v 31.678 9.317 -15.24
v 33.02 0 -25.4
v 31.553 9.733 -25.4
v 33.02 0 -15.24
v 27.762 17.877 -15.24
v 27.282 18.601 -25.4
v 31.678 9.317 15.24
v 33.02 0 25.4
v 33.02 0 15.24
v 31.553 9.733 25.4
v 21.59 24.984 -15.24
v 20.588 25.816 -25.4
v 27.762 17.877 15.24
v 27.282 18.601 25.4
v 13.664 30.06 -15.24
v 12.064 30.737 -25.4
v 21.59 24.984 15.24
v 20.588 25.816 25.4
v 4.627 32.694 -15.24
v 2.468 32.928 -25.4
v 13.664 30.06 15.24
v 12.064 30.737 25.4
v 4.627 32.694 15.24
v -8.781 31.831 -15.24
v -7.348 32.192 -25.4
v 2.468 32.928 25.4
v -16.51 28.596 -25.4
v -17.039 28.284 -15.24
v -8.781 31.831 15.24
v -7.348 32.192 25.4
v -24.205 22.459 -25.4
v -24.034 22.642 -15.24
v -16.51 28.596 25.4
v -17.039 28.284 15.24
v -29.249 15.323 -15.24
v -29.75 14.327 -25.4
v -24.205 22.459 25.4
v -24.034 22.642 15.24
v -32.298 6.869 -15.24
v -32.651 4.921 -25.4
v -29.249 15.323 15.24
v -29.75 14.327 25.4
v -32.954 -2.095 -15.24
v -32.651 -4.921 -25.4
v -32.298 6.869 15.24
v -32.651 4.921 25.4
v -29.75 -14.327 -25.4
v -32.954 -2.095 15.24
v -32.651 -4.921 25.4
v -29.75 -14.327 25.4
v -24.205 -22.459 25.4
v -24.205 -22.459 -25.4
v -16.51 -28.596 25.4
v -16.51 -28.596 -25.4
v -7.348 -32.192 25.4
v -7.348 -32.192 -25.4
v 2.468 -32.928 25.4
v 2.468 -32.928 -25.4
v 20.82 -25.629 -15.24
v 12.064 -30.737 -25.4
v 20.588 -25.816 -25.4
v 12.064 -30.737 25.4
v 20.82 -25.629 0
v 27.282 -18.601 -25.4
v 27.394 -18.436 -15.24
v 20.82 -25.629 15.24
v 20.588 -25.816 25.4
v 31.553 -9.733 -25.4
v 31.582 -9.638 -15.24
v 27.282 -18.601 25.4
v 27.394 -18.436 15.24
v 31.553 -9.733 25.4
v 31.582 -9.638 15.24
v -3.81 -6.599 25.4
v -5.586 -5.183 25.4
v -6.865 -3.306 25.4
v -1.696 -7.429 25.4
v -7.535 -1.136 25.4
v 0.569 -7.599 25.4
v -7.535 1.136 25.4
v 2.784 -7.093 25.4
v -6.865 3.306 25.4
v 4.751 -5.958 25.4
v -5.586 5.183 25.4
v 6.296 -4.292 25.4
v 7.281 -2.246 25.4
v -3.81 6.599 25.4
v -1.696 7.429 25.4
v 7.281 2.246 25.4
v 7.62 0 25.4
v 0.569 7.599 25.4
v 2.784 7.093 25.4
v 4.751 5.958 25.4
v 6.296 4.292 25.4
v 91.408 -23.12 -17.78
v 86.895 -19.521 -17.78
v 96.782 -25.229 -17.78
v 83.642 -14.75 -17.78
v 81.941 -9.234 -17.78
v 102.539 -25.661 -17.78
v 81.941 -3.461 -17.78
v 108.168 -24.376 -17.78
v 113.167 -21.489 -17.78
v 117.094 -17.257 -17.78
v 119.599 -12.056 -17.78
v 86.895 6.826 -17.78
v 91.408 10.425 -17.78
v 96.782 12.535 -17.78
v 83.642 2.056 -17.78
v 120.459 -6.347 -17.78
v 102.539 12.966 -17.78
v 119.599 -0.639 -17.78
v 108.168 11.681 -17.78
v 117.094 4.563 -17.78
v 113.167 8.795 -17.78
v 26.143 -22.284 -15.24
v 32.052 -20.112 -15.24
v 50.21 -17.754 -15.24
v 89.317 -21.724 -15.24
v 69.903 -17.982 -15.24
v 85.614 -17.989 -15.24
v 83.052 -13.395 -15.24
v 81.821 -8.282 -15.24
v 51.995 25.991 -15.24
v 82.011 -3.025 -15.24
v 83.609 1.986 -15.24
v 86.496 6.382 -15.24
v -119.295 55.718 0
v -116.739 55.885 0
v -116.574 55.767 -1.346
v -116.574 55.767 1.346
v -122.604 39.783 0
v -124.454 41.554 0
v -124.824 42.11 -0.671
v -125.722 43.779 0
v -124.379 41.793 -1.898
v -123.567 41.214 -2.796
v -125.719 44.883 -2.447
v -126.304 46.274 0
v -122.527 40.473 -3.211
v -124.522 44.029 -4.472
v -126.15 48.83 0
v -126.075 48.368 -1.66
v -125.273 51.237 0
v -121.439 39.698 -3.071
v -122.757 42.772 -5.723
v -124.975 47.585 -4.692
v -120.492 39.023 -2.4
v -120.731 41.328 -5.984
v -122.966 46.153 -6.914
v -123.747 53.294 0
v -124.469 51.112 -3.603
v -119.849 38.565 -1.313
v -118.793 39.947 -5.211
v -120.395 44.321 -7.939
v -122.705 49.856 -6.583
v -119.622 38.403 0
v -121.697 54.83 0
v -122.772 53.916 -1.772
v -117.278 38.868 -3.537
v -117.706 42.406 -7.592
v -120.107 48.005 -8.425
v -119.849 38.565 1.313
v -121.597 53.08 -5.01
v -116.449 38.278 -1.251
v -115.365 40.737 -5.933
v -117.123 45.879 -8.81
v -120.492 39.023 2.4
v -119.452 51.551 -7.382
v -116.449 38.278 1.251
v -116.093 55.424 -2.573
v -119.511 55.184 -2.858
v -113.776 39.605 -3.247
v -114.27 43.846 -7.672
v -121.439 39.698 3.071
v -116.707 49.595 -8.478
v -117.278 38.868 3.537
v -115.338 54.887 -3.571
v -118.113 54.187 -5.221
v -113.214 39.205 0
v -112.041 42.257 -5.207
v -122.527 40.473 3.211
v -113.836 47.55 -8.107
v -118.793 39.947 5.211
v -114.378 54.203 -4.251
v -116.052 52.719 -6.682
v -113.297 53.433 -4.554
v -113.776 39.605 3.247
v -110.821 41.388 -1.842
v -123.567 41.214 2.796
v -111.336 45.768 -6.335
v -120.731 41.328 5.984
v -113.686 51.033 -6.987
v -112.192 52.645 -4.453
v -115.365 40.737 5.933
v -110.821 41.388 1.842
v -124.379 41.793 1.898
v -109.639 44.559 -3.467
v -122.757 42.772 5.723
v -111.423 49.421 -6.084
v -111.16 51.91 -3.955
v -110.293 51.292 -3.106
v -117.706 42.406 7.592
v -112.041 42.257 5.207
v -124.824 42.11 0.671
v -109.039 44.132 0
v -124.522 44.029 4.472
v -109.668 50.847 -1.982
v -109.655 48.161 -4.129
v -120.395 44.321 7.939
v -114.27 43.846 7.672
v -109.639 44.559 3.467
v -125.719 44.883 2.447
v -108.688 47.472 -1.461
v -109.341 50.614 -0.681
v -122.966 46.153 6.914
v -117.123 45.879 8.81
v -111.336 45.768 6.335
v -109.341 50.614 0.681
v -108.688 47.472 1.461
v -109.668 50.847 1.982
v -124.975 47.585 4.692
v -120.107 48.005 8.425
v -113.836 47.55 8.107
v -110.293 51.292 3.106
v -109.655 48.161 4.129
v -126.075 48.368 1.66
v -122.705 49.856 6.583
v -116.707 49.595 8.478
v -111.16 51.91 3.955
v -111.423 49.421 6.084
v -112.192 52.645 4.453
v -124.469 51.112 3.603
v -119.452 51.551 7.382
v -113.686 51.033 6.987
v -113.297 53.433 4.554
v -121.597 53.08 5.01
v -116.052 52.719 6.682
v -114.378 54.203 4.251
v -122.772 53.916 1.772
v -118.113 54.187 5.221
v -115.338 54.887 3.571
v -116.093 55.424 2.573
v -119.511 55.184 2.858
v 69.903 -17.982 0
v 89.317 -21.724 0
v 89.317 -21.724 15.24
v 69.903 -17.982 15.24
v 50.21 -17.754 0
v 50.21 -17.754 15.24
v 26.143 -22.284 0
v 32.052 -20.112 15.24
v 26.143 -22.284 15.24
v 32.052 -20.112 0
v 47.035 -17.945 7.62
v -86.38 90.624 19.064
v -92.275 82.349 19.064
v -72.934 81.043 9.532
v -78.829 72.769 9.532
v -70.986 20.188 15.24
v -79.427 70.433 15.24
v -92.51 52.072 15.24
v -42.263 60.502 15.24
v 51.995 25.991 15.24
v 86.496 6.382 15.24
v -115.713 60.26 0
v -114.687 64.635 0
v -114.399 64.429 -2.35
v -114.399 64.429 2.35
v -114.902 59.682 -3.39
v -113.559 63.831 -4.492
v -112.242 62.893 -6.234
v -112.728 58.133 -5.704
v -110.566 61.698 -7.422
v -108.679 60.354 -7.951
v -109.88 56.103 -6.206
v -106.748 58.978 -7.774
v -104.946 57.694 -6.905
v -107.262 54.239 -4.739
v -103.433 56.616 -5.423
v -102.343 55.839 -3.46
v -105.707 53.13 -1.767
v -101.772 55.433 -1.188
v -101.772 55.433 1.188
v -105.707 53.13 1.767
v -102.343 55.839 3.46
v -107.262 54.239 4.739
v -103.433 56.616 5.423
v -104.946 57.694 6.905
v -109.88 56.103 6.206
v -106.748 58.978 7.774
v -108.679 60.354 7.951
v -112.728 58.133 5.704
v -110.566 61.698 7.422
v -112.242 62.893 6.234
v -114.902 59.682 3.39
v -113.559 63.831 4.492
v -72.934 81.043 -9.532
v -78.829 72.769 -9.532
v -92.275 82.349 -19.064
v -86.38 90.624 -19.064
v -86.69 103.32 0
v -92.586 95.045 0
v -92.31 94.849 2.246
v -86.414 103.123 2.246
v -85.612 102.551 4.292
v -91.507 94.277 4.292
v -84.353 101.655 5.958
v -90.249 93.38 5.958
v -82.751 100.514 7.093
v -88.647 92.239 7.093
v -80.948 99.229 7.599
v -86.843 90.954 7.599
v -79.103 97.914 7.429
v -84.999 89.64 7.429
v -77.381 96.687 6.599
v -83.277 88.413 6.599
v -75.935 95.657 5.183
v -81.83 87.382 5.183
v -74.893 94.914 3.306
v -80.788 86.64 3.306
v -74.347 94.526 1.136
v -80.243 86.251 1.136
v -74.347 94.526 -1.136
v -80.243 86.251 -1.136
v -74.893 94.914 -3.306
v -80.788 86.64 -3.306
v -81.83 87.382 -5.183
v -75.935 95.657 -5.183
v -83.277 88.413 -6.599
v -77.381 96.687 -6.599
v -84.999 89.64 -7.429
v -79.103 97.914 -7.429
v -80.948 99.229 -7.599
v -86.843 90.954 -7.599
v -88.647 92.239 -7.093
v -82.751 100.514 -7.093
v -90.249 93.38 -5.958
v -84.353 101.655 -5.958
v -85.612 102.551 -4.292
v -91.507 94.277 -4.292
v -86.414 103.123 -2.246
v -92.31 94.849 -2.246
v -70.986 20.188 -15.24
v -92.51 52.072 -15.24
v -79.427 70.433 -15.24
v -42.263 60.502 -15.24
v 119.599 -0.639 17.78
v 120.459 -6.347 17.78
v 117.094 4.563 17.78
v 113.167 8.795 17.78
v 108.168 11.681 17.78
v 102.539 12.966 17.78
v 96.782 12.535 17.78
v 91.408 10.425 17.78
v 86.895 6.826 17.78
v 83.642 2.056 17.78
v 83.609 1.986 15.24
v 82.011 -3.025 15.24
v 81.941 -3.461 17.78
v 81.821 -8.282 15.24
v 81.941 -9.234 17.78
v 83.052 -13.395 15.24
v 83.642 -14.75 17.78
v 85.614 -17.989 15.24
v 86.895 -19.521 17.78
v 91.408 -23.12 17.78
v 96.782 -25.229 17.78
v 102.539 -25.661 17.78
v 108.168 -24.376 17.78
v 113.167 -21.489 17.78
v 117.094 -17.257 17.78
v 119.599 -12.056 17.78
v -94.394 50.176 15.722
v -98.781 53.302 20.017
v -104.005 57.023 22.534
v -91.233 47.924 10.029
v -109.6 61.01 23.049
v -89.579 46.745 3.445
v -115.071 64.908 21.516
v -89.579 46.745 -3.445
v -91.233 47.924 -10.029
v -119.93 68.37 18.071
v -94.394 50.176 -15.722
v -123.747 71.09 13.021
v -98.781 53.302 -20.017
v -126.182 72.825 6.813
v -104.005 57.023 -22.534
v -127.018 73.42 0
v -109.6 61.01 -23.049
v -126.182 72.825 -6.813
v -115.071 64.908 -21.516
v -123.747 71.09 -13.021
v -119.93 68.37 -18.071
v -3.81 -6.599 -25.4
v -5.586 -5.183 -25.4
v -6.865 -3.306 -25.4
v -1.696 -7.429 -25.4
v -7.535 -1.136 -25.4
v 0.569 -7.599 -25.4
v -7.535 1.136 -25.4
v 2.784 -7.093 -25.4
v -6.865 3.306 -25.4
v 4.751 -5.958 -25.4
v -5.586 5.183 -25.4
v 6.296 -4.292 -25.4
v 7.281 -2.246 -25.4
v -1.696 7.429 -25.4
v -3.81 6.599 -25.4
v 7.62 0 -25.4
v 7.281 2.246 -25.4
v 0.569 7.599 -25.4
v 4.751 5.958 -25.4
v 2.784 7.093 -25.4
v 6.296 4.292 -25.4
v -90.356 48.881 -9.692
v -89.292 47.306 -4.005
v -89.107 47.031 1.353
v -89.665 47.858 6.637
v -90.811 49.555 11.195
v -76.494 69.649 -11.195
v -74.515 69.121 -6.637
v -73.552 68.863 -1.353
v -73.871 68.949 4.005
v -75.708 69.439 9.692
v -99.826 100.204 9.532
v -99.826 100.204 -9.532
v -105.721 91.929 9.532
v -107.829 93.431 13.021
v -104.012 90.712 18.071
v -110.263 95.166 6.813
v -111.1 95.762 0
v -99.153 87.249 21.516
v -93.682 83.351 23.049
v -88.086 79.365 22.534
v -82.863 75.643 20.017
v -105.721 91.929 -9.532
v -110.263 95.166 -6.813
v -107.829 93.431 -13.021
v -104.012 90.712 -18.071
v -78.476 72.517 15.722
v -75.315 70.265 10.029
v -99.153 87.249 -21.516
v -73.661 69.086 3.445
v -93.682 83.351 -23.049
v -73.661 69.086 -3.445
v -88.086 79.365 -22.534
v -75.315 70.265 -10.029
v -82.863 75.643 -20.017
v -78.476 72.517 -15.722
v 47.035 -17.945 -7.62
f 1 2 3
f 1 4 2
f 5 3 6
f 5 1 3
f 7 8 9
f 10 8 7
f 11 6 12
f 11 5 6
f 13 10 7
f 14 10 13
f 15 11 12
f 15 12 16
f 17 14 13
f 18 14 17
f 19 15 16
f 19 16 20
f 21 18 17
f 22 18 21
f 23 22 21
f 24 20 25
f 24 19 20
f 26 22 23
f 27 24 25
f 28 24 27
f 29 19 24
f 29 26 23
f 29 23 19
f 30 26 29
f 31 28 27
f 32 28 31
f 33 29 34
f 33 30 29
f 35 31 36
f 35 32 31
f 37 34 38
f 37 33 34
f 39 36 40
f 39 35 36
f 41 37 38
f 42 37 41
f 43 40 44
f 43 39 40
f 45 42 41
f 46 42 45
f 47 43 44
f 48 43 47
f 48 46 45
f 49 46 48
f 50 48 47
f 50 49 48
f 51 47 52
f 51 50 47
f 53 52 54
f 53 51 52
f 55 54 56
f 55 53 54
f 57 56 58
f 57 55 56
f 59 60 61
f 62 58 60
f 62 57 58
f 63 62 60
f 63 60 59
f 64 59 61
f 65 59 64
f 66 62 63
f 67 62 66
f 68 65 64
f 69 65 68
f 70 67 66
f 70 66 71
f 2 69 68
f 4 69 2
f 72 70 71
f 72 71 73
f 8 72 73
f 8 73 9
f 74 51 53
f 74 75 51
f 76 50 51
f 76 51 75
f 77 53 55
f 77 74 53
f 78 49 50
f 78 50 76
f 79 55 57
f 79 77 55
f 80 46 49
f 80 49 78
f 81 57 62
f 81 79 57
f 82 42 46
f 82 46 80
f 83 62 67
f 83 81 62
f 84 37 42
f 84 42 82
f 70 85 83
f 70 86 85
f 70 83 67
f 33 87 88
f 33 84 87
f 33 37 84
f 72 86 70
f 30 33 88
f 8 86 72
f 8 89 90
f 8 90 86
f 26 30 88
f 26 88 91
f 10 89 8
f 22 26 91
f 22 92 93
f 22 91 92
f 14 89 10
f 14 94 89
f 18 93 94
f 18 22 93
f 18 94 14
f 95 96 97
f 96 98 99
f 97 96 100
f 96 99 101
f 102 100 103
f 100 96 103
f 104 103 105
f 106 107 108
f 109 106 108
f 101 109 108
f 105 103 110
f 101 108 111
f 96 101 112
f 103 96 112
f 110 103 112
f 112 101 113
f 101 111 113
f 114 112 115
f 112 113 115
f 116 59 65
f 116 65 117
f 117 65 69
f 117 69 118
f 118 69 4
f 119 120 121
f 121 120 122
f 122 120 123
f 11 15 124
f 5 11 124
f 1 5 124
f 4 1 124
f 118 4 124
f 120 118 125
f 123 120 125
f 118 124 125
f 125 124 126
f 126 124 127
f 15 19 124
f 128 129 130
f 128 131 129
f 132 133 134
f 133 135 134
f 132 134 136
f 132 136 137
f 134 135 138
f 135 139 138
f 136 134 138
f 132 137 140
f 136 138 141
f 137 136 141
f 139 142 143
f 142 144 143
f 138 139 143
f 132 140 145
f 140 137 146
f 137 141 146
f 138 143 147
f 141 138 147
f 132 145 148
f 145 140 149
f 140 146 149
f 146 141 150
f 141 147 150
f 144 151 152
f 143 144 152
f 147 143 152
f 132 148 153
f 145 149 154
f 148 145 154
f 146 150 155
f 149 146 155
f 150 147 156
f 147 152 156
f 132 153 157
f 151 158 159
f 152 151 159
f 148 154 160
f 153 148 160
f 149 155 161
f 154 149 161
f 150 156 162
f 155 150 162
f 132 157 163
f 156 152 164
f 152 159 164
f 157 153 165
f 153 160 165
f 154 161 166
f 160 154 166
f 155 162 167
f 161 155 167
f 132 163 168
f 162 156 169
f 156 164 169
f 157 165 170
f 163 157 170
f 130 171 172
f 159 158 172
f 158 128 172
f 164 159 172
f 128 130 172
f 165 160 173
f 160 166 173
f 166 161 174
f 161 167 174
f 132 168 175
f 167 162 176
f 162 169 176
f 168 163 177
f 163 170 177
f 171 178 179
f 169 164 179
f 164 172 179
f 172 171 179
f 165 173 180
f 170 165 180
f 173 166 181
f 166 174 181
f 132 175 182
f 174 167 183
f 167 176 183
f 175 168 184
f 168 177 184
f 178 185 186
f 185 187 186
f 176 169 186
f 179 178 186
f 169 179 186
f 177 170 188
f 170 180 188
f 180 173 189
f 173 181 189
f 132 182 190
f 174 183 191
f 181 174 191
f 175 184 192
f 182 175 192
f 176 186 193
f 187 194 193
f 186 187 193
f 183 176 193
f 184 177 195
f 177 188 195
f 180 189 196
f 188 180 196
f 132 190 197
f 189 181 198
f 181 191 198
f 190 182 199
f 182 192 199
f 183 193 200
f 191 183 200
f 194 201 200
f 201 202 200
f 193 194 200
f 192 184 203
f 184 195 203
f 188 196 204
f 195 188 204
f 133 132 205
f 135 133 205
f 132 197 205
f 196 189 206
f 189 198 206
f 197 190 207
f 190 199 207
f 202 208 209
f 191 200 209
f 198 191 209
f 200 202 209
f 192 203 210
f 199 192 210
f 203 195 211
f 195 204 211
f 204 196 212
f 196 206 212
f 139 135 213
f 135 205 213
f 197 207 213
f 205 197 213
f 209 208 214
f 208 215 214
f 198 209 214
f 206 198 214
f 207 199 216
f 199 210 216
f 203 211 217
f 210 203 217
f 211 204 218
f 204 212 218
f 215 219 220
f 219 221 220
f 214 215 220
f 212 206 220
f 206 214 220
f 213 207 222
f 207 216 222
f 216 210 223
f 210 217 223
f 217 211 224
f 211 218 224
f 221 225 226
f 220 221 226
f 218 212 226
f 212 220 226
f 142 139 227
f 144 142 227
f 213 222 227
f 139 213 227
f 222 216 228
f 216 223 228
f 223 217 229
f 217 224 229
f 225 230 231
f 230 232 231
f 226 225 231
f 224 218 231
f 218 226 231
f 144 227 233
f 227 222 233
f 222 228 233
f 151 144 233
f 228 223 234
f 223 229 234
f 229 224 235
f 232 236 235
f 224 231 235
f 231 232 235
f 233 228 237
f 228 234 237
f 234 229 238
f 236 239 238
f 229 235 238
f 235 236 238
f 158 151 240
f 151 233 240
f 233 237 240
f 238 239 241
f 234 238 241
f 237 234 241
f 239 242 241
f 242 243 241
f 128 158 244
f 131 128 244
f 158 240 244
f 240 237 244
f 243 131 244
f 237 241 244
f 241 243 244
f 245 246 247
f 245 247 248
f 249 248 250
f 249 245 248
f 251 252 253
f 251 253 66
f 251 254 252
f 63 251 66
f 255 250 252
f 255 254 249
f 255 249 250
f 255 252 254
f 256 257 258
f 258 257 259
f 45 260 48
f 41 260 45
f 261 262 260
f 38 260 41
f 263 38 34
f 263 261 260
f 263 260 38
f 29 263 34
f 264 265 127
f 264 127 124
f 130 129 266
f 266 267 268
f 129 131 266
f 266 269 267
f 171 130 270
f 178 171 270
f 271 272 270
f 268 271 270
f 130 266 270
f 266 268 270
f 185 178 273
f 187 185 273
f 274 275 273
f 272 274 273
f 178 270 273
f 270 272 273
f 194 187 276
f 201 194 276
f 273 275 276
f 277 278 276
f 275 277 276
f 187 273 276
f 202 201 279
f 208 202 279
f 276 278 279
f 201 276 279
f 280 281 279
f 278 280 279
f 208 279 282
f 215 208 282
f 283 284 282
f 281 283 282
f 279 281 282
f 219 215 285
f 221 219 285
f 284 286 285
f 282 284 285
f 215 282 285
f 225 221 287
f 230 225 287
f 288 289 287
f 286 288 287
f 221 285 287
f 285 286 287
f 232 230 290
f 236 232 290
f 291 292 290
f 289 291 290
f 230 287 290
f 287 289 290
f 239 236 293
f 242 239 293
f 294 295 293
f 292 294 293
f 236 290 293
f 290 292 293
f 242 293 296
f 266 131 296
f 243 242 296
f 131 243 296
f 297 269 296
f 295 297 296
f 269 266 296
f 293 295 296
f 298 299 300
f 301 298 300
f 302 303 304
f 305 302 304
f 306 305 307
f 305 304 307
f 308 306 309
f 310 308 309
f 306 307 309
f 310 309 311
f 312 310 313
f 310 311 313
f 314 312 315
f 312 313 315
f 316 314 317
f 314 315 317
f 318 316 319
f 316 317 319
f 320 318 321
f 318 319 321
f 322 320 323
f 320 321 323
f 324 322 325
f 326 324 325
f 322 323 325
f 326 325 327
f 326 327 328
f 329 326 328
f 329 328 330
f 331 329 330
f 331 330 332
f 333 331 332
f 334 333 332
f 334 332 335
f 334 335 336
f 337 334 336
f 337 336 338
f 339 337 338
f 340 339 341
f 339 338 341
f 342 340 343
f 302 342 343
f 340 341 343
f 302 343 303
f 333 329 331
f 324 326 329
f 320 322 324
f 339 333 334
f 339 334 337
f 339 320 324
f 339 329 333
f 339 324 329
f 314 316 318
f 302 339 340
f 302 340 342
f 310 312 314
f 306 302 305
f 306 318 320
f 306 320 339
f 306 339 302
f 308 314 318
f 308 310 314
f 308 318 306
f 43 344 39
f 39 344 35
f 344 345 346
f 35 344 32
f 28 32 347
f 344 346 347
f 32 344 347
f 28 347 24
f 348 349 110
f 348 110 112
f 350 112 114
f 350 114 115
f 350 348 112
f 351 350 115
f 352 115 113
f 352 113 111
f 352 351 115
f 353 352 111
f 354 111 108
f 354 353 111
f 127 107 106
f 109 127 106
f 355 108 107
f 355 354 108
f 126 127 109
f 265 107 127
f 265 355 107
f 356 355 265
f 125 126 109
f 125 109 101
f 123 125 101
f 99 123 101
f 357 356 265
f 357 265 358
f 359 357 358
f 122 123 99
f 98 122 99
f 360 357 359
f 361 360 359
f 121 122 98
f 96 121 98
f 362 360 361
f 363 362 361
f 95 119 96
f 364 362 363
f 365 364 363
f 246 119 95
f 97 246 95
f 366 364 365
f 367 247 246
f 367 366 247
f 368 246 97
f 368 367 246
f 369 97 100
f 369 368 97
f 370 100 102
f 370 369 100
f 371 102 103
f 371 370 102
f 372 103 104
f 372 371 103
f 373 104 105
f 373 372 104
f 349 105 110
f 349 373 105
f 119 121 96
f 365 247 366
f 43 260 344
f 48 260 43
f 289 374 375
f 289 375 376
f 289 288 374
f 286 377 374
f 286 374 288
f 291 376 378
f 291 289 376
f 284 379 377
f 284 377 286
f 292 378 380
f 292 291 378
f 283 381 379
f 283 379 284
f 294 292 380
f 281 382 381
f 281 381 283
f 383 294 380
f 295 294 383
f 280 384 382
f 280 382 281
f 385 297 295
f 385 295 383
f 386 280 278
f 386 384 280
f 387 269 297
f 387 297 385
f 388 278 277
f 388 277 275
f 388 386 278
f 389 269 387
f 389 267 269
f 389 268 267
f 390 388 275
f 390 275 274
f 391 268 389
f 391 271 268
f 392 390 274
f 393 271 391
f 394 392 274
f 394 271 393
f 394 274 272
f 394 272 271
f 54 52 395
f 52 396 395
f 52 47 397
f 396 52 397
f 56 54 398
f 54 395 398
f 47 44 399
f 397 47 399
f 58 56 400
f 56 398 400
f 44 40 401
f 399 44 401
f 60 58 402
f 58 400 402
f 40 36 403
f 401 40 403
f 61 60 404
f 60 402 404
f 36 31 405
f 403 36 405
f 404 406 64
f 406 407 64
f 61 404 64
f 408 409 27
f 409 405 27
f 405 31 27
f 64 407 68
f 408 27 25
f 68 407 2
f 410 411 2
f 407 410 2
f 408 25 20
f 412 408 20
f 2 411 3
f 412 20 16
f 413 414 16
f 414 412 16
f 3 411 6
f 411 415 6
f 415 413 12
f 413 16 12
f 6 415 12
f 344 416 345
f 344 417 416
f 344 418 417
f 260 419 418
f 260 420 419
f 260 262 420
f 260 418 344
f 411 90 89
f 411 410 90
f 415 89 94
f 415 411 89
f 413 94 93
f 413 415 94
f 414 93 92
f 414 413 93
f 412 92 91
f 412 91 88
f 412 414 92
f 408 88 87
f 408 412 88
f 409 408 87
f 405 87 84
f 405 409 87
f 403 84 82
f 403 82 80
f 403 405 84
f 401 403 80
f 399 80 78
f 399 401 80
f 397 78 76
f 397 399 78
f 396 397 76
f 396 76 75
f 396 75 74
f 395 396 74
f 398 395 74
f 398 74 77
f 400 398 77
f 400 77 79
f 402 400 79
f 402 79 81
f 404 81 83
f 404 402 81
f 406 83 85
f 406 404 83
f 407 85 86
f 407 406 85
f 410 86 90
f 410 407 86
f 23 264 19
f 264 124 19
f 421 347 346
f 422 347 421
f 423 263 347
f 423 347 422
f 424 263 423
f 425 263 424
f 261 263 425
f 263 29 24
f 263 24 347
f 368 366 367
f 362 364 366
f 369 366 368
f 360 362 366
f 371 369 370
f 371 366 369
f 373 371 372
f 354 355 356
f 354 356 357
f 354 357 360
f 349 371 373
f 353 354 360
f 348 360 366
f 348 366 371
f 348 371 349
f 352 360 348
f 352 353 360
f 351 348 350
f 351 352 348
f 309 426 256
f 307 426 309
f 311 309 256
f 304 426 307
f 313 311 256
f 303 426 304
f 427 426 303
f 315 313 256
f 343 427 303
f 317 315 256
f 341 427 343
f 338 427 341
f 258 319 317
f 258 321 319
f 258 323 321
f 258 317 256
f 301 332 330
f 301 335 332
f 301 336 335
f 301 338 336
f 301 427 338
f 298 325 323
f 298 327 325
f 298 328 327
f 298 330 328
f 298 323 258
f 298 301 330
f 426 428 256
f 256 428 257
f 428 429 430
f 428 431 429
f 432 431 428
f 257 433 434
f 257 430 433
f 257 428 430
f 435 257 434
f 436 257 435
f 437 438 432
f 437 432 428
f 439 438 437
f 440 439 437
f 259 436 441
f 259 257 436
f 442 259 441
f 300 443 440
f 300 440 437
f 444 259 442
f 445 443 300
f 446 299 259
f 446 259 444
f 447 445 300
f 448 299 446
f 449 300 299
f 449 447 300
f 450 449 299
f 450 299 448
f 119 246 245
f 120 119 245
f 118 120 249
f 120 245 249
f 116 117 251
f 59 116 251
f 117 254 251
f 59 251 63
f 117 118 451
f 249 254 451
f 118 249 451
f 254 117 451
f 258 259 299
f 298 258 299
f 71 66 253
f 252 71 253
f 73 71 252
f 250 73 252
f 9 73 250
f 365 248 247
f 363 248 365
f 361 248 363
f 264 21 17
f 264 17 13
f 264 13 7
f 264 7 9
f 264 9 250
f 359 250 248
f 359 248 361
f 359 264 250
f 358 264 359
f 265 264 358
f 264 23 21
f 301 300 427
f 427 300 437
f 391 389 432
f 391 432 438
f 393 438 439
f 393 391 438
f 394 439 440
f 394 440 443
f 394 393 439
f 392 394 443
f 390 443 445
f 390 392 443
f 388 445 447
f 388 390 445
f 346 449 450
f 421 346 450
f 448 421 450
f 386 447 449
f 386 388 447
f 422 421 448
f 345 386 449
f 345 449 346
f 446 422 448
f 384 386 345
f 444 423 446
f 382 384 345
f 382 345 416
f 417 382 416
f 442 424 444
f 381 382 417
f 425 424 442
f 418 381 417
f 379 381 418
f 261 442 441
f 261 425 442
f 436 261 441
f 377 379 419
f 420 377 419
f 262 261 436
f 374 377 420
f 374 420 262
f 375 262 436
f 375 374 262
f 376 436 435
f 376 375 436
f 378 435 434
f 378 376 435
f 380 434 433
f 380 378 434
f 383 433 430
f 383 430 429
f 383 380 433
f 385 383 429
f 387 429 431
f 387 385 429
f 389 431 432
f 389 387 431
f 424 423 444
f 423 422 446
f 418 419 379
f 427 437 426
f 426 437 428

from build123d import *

# Parameters (mm, degrees)
SKETCH1_R           = 7.62
BOSS_EXTRUDE1_DEPTH = 25.4
BOSS_EXTRUDE2_DEPTH = 17.78
BOSS_EXTRUDE3_DEPTH = 15.24
BOSS_EXTRUDE4_DEPTH = 15.24
BOSS_EXTRUDE5_DEPTH = 10.16
SKETCH8_R           = 7.62
BOSS_EXTRUDE6_DEPTH = 10.16


with BuildPart() as part:
    # Sketch1 → Boss-Extrude1 (new, symmetric)
    with BuildSketch(Plane.XY):
        with BuildLine():
            ThreePointArc((33.02, 0), (24.930864244, 21.651152581), (4.626759051, 32.694242623))
            ThreePointArc((4.626759051, 32.694242623), (-2.121746437, 32.951761593), (-8.781498221, 31.830892055))
            ThreePointArc((-8.781498221, 31.830892055), (-26.892130639, 19.160733538), (-32.953500531, -2.094565059))
            ThreePointArc((-32.953500531, -2.094565059), (-13.239146526, -30.249717342), (20.819898028, -25.62912886))
            ThreePointArc((20.819898028, -25.62912886), (29.814370972, -14.19238118), (33.02, 0))
        make_face()
        Circle(SKETCH1_R, mode=Mode.SUBTRACT)
    extrude(amount=BOSS_EXTRUDE1_DEPTH, both=True)



with BuildPart() as body_2:
    # Sketch1<3> → Boss-Extrude2 (new, symmetric)
    with BuildSketch(Plane.XY):
        with BuildLine():
            ThreePointArc((120.4595, -6.347255181), (107.889218857, 11.7882865), (86.495604602, 6.382446214))
            ThreePointArc((86.495604602, 6.382446214), (81.821344439, -8.281651859), (89.316955097, -21.724133075))
            ThreePointArc((89.316955097, -21.724133075), (109.666580867, -23.713216693), (120.4595, -6.347255181))
        make_face()
    extrude(amount=BOSS_EXTRUDE2_DEPTH, both=True)


with BuildPart() as part_1:
    add(part.part)

    add(body_2.part)  # Boss-Extrude3 merges body 2
    # Sketch1<4> → Boss-Extrude3 (add, symmetric)
    with BuildSketch(Plane.XY):
        with BuildLine():
            ThreePointArc((89.316955097, -21.724133075), (81.821344439, -8.281651859), (86.495604602, 6.382446214))
            Line((86.495604602, 6.382446214), (51.99535192, 25.990827948))
            Line((51.99535192, 25.990827948), (4.626759051, 32.694242623))
            ThreePointArc((4.626759051, 32.694242623), (24.930864244, 21.651152581), (33.02, 0))
            ThreePointArc((33.02, 0), (29.814370972, -14.19238118), (20.819898028, -25.62912886))
            add(Edge.make_bspline(
                [(89.316955097, -21.724133075), (75.276461203, -17.426169931), (52.836610599, -16.671014881), (28.008203074, -19.789688164), (20.819898028, -25.62912886)],
                knots=[0, 0, 0, 0, 0.609501507, 1, 1, 1, 1], degree=3))
        make_face()
    extrude(amount=BOSS_EXTRUDE3_DEPTH, both=True)

    # Sketch1<5> → Boss-Extrude4 (add, symmetric)
    with BuildSketch(Plane.XY):
        with BuildLine():
            ThreePointArc((-32.953500531, -2.094565059), (-26.892130639, 19.160733538), (-8.781498221, 31.830892055))
            Line((-8.781498221, 31.830892055), (-42.262603979, 60.502117005))
            Line((-42.262603979, 60.502117005), (-86.872548051, 72.422885384))
            Line((-86.872548051, 72.422885384), (-96.821390465, 58.459663706))
            Line((-96.821390465, 58.459663706), (-70.986413412, 20.188188826))
            Line((-70.986413412, 20.188188826), (-32.953500531, -2.094565059))
        make_face()
    extrude(amount=BOSS_EXTRUDE4_DEPTH, both=True)



with BuildPart() as body_2_2:
    # Sketch5 → Revolve2 (revolve)
    with BuildSketch(Plane.XY):
        with BuildLine():
            Line((-96.821390465, 58.459663706), (-86.20929189, 73.353766829))
            Line((-86.20929189, 73.353766829), (-94.483793625, 79.249377149))
            Line((-94.483793625, 79.249377149), (-122.603936438, 39.782696366))
            ThreePointArc((-122.603936438, 39.782696366), (-111.841735812, 40.121260824), (-109.299895081, 50.584464631))
            Line((-109.299895081, 50.584464631), (-96.821390465, 58.459663706))
        make_face()
    revolve(axis=Axis((-94.483793625, 79.249377149, 0), (-0.5802766062403011, -0.8144194621018328, 0)))


with BuildPart() as part_2:
    add(part_1.part)

    add(body_2_2.part)  # Revolve4 merges body 2 2
    # Sketch6 → Revolve4 (revolve)
    with BuildSketch(Plane.XY):
        Polygon((-108.193400918, 60.007913893), (-92.275253056, 82.349068577), (-111.099744503, 95.761582054), (-127.017892365, 73.42042737), align=None)
    revolve(axis=Axis((-94.483793625, 79.249377149, 0), (-0.5802766062403006, -0.8144194621018331, 0)))

    # Sketch7 → Boss-Extrude5 (add)
    with BuildSketch(Plane(origin=(7.846217937, 11.012183713, 0), x_dir=(0.814419462101833, -0.5802766062403008, 0), z_dir=(0.5802766062403008, 0.8144194621018331, 0))):
        Polygon((-106.426, -9.532052944), (-106.426, 9.532052944), (-122.936, 19.064105889), (-139.446, 9.532052944), (-139.446, -9.532052944), (-122.936, -19.064105889), align=None)
    extrude(amount=BOSS_EXTRUDE5_DEPTH)

    # Sketch8 → Boss-Extrude6 (add)
    with BuildSketch(Plane(origin=(13.741828257, 19.286685448, 0), x_dir=(0.814419462101833, -0.5802766062403008, 0), z_dir=(0.5802766062403008, 0.8144194621018331, 0))):
        with Locations((-122.936, 0)):
            Circle(SKETCH8_R)
    extrude(amount=BOSS_EXTRUDE6_DEPTH)


solid = part_2.part
